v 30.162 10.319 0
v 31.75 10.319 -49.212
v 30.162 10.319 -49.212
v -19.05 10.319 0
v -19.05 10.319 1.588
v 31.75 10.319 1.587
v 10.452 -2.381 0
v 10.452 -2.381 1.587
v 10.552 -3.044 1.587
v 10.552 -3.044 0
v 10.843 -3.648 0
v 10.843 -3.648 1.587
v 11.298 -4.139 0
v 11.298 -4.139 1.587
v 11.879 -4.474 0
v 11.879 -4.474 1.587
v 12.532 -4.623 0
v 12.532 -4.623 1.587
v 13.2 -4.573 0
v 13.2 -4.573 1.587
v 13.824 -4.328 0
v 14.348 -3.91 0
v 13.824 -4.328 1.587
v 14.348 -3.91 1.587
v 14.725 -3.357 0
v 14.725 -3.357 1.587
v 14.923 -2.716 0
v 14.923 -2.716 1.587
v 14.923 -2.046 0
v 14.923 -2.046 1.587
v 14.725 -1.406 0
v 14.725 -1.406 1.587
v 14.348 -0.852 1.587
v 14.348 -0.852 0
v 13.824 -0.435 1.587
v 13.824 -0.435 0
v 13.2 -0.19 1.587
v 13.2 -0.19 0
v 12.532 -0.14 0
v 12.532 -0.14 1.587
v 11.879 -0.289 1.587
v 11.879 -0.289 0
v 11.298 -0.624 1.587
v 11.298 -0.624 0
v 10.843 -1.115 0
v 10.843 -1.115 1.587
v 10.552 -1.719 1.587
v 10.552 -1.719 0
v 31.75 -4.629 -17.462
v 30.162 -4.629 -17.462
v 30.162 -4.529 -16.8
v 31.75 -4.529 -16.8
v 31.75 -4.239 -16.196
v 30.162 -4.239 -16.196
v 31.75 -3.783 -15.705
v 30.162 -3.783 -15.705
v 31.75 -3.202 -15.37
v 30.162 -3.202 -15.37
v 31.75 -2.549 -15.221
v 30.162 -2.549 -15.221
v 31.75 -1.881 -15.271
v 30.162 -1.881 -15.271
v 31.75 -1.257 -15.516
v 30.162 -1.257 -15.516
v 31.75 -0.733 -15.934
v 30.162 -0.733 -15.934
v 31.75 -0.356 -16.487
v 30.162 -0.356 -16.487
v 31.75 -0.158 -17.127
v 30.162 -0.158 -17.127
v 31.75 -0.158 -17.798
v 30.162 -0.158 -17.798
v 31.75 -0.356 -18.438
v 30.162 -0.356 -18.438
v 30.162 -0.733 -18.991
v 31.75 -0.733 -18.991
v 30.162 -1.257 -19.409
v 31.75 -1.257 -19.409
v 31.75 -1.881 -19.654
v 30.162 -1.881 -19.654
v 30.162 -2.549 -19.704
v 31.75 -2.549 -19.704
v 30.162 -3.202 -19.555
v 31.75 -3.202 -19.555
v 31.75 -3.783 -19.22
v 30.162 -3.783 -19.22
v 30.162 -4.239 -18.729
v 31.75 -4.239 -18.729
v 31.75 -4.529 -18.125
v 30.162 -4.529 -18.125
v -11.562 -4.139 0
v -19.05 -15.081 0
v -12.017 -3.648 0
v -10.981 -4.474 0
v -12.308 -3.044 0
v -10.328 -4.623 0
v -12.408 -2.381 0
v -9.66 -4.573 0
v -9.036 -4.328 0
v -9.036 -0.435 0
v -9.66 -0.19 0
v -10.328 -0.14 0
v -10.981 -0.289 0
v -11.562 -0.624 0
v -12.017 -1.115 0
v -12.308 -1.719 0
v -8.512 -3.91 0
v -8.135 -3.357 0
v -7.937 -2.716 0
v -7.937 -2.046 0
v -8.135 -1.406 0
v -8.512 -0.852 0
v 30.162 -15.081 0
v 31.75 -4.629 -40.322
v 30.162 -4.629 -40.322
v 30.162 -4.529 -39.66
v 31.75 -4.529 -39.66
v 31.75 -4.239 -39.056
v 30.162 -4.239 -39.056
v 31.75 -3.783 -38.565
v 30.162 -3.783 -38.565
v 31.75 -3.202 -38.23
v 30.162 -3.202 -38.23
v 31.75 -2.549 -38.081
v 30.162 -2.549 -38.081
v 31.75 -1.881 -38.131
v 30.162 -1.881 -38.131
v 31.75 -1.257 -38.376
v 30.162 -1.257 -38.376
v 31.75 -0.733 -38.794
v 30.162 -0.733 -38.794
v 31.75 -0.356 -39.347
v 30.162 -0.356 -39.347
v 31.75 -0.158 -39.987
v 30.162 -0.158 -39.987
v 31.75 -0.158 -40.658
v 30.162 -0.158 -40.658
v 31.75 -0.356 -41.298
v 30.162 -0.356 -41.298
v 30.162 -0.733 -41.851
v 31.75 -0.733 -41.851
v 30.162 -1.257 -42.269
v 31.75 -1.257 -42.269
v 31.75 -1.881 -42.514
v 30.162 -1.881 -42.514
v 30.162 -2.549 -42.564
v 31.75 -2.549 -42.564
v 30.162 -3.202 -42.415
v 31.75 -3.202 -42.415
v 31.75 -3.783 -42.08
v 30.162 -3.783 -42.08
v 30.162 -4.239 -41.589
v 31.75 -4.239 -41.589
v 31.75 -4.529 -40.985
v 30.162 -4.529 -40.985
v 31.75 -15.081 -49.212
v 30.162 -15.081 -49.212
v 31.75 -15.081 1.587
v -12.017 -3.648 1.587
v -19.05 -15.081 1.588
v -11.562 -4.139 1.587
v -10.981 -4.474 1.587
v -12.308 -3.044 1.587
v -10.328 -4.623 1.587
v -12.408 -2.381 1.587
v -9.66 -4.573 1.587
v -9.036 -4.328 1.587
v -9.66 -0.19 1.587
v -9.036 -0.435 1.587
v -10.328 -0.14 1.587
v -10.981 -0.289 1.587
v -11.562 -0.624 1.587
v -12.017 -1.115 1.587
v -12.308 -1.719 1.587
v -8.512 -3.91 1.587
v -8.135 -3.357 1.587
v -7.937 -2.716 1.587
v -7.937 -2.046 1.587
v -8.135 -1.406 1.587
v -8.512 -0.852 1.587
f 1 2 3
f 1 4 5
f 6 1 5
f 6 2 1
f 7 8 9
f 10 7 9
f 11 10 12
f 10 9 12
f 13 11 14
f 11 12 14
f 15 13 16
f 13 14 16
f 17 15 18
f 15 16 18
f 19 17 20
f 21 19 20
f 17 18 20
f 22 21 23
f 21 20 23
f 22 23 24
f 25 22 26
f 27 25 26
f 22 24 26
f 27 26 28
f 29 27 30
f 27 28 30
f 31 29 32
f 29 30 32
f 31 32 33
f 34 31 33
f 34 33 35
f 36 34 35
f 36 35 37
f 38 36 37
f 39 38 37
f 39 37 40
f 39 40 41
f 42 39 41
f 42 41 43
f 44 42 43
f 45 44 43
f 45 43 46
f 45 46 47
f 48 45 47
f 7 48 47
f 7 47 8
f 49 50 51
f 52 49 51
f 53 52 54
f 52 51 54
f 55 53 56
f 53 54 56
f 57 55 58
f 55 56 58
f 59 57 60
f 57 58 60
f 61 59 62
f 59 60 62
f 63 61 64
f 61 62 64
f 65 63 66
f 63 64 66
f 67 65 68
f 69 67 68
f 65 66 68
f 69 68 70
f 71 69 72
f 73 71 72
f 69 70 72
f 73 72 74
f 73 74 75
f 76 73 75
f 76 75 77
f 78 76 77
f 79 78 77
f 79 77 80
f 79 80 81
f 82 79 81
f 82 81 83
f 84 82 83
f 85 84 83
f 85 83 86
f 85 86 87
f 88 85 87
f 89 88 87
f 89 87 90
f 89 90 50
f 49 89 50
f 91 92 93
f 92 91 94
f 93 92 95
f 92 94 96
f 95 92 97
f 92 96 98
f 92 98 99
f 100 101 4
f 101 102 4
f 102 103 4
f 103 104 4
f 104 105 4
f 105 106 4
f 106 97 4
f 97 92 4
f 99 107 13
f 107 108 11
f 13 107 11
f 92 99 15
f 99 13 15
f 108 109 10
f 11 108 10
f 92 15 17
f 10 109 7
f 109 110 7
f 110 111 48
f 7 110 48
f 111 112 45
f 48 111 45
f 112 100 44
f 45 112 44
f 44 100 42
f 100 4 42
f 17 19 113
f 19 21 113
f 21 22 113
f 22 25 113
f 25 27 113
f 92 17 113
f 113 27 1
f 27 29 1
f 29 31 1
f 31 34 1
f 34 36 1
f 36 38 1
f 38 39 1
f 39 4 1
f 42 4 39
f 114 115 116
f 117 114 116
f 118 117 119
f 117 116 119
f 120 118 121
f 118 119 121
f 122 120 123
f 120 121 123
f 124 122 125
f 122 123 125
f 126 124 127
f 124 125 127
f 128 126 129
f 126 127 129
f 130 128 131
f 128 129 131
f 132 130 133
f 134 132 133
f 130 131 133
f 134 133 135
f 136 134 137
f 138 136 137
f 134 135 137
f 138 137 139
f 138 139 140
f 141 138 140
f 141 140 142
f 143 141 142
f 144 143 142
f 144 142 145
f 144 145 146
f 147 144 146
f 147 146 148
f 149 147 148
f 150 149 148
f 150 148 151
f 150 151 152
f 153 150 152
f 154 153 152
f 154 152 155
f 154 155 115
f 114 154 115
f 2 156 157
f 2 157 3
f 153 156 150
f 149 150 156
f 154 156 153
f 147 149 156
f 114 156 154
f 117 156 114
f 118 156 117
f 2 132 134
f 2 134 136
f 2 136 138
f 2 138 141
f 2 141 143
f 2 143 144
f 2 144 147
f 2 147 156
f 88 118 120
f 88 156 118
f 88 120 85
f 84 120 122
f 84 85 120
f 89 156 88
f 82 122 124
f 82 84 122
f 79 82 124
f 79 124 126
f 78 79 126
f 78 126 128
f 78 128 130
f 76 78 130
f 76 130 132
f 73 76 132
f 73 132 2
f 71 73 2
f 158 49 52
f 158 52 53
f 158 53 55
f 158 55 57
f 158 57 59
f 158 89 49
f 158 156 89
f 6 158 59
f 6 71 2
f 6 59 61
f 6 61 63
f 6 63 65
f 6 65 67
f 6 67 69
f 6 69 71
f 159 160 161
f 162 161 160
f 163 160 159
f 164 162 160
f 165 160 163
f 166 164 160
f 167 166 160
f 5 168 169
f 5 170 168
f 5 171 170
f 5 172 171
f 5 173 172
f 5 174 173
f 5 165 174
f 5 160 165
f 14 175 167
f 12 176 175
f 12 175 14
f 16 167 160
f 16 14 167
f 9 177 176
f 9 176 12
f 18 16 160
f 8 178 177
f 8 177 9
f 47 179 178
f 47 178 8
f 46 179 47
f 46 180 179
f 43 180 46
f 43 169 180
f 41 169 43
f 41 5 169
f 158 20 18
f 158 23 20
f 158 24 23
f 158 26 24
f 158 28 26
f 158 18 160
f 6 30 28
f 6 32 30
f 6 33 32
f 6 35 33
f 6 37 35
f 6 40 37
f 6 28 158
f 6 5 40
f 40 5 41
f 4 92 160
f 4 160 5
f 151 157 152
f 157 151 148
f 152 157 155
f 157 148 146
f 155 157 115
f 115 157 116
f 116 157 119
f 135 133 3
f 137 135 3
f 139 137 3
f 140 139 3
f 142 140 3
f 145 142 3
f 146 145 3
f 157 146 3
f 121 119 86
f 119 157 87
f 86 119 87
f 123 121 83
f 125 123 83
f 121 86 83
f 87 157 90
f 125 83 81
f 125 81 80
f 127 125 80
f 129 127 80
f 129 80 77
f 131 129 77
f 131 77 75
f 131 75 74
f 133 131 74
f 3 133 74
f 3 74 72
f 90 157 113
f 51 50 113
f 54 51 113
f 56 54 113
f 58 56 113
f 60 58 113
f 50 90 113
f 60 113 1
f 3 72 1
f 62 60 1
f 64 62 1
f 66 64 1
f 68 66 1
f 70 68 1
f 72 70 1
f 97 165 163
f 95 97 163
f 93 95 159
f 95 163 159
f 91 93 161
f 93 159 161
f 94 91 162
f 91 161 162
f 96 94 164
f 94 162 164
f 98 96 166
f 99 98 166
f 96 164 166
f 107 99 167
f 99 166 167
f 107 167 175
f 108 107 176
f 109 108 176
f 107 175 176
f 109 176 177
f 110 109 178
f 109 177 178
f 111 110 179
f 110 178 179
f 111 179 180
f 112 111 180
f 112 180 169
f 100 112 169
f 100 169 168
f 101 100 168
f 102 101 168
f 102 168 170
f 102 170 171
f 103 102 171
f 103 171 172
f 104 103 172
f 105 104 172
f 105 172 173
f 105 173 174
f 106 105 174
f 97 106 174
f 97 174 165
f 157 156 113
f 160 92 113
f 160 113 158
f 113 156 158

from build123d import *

# Parameters (mm, degrees)
F0_W     = 50.8
F0_H     = 25.4
F1_DEPTH = 1.5875
F2_D     = 4.4958
F3_W     = 25.4
F3_H     = 50.8
F4_DEPTH = 1.5875
F5_D     = 4.4958


# Not quite as in the source:
# - a length typed as a fraction of an inch, garbled in the dataset ("3 / 203.2 mm" for 3/8 in), is restored


with BuildPart() as f1:
    # F0 (on Top) → F1 (new body)
    with BuildSketch(Plane.XY):
        with Locations((6.3499998267, -2.3812473148)):
            Rectangle(F0_W, F0_H)
    extrude(amount=F1_DEPTH)

    # F2 (through all)
    with Locations(Plane(origin=(0, 0, 0), x_dir=(1, 0, 0), z_dir=(0, 0, -1))):
        with Locations((-10.1600001733, 2.3812473148), (12.6999998267, 2.3812473148)):
            Hole(F2_D / 2)

    # F3 (on face) → F4 (join)
    with BuildSketch(Plane.YZ.offset(31.7499998267)):
        with Locations((-2.3812473148, -23.8125)):
            Rectangle(F3_W, F3_H)
    extrude(amount=-F4_DEPTH)

    # F5 (through all)
    with Locations(Plane.YZ.offset(31.7499998267)):
        with Locations((-2.3812473148, -17.4625), (-2.3812473148, -40.3225)):
            Hole(F5_D / 2)


solid = f1.part
